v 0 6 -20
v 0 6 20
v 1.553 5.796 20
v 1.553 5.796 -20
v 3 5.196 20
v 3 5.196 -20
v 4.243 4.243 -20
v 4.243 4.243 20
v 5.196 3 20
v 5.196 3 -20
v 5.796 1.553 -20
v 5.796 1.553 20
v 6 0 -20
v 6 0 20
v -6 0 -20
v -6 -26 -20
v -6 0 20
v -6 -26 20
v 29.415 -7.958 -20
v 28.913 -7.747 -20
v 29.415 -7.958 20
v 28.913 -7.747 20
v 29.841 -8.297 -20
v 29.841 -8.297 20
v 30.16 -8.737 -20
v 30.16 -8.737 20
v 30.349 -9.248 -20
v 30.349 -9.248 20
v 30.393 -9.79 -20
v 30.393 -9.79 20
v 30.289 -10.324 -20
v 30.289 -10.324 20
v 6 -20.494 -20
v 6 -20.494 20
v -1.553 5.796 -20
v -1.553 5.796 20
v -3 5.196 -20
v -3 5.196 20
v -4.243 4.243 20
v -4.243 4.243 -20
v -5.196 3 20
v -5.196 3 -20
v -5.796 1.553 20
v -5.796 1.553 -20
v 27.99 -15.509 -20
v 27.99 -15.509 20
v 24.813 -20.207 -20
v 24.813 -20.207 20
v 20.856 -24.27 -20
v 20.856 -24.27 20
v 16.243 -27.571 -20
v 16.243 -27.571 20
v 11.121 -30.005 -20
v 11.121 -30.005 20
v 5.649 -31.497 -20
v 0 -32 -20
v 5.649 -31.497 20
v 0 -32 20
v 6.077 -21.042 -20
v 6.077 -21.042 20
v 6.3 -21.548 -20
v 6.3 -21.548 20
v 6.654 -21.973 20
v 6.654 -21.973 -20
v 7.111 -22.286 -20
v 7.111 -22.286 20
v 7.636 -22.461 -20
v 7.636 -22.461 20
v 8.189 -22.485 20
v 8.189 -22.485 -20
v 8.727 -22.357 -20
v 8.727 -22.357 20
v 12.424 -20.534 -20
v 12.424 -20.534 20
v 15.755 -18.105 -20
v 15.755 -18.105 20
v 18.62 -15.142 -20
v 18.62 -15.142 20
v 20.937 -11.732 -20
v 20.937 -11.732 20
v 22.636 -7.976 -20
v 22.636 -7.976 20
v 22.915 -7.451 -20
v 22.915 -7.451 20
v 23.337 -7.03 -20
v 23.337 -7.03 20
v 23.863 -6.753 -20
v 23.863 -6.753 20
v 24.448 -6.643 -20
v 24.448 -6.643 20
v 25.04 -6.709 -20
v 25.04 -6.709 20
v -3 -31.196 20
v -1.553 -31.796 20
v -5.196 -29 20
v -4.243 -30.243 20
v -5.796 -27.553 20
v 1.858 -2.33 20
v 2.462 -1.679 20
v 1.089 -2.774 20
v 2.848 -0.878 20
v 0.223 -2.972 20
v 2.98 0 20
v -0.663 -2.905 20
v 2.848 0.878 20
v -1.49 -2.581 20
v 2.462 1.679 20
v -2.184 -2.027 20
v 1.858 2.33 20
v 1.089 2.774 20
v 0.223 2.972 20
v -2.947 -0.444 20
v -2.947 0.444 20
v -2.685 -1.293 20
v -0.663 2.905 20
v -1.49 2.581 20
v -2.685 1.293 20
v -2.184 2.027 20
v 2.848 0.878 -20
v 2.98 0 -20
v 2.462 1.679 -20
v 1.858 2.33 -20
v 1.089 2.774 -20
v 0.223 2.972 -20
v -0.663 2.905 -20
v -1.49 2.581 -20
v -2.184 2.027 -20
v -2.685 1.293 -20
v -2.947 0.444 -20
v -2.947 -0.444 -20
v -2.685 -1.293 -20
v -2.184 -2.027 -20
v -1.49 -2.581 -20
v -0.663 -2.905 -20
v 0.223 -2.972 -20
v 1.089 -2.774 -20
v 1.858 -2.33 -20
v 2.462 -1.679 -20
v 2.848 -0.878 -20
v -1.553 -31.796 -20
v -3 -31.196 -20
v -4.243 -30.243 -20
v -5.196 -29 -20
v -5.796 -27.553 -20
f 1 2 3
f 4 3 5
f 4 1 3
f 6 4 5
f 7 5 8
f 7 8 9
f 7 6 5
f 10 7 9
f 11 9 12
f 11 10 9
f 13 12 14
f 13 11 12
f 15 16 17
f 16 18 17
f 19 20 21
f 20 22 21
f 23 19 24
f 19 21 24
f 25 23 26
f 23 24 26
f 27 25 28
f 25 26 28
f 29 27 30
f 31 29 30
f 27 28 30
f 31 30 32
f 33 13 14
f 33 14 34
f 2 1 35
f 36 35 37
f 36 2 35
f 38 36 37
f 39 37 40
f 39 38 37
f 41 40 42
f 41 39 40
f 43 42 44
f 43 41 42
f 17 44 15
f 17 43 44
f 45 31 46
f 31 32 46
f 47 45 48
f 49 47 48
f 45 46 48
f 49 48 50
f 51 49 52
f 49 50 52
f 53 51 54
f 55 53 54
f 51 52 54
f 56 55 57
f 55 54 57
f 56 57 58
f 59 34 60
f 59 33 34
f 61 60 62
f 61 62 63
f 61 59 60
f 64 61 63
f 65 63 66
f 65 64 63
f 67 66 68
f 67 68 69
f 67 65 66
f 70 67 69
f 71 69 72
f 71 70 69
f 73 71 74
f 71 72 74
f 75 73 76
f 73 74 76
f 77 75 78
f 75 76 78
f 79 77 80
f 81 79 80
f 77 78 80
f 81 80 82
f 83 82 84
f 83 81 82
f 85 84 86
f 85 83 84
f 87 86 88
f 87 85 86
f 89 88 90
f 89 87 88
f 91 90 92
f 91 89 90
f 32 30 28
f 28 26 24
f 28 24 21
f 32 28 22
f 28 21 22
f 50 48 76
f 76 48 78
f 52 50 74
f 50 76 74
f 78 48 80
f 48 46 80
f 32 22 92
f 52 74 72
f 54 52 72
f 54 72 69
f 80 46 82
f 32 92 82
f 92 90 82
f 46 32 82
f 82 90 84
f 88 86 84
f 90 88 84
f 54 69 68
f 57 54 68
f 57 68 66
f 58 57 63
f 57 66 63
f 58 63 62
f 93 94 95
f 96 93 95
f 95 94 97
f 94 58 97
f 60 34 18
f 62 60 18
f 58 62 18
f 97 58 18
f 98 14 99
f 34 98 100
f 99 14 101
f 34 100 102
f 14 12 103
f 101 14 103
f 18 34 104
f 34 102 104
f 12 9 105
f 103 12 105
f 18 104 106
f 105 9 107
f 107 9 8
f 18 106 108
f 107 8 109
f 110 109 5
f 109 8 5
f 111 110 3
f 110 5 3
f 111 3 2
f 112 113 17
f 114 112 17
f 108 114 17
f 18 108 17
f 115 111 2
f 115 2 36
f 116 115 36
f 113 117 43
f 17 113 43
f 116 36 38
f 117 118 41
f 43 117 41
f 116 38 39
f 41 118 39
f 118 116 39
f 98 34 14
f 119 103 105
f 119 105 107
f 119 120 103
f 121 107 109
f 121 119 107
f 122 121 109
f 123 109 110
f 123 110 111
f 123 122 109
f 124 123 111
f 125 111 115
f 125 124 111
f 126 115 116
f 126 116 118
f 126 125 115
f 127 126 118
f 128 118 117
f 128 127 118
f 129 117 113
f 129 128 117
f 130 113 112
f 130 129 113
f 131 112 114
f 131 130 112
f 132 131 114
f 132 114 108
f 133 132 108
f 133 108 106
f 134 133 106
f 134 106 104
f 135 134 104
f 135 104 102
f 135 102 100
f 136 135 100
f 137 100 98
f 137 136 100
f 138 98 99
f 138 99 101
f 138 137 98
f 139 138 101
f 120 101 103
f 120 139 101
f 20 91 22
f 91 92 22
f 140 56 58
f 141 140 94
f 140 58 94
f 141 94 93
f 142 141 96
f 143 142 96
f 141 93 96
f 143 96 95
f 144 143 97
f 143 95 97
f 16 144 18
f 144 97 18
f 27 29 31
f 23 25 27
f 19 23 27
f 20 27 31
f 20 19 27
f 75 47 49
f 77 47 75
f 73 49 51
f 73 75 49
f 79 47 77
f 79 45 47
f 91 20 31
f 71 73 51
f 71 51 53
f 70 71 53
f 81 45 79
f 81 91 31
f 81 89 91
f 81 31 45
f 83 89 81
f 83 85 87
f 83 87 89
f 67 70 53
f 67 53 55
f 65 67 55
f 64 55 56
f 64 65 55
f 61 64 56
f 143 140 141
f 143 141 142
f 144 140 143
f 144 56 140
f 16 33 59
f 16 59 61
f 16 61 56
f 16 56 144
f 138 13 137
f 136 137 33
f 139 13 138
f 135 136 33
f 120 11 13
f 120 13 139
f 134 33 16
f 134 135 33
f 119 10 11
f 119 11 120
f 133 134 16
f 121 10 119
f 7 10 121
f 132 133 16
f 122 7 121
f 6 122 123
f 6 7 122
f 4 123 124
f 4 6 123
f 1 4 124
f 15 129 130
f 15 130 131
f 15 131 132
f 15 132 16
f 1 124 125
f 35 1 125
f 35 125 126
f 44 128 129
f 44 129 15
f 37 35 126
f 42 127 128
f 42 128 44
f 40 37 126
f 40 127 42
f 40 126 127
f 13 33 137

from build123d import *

# Parameters (mm, degrees)
SKETCH2_R           = 2.98
BOSS_EXTRUDE1_DEPTH = 20
FILLET1_R           = 6
FILLET2_R           = 2


with BuildPart() as part:
    # Sketch2 → Boss-Extrude1 (new, symmetric)
    with BuildSketch(Plane.XY):
        with BuildLine():
            Line((-6, 6), (6, 6))
            Line((6, 6), (6, -23.237900077))
            ThreePointArc((6, -23.237900077), (16.893008204, -17.047764481), (23.182219831, -6.211657082))
            Line((23.182219831, -6.211657082), (30.909626441, -8.282209443))
            ThreePointArc((30.909626441, -8.282209443), (19.480365728, -25.387306889), (0, -32))
            Line((0, -32), (-6, -32))
            Line((-6, -32), (-6, 6))
        make_face()
        Circle(SKETCH2_R, mode=Mode.SUBTRACT)
    extrude(amount=BOSS_EXTRUDE1_DEPTH, both=True)

    # Fillet1
    fillet1_edges = [part.edges().sort_by_distance(p)[0] for p in [
        (6, 6, 0),
        (-6, 6, 0),
        (-6, -32, 0),
    ]]
    fillet(fillet1_edges, radius=FILLET1_R - 0.0001)  # a hair under: the kernel refuses the full size

    # Fillet2
    fillet2_edges = [part.edges().sort_by_distance(p)[0] for p in [
        (6, -23.237900077, 0),
        (23.182219831, -6.211657082, 0),
        (30.909626441, -8.282209443, 0),
    ]]
    fillet(fillet2_edges, radius=FILLET2_R)


solid = part.part
